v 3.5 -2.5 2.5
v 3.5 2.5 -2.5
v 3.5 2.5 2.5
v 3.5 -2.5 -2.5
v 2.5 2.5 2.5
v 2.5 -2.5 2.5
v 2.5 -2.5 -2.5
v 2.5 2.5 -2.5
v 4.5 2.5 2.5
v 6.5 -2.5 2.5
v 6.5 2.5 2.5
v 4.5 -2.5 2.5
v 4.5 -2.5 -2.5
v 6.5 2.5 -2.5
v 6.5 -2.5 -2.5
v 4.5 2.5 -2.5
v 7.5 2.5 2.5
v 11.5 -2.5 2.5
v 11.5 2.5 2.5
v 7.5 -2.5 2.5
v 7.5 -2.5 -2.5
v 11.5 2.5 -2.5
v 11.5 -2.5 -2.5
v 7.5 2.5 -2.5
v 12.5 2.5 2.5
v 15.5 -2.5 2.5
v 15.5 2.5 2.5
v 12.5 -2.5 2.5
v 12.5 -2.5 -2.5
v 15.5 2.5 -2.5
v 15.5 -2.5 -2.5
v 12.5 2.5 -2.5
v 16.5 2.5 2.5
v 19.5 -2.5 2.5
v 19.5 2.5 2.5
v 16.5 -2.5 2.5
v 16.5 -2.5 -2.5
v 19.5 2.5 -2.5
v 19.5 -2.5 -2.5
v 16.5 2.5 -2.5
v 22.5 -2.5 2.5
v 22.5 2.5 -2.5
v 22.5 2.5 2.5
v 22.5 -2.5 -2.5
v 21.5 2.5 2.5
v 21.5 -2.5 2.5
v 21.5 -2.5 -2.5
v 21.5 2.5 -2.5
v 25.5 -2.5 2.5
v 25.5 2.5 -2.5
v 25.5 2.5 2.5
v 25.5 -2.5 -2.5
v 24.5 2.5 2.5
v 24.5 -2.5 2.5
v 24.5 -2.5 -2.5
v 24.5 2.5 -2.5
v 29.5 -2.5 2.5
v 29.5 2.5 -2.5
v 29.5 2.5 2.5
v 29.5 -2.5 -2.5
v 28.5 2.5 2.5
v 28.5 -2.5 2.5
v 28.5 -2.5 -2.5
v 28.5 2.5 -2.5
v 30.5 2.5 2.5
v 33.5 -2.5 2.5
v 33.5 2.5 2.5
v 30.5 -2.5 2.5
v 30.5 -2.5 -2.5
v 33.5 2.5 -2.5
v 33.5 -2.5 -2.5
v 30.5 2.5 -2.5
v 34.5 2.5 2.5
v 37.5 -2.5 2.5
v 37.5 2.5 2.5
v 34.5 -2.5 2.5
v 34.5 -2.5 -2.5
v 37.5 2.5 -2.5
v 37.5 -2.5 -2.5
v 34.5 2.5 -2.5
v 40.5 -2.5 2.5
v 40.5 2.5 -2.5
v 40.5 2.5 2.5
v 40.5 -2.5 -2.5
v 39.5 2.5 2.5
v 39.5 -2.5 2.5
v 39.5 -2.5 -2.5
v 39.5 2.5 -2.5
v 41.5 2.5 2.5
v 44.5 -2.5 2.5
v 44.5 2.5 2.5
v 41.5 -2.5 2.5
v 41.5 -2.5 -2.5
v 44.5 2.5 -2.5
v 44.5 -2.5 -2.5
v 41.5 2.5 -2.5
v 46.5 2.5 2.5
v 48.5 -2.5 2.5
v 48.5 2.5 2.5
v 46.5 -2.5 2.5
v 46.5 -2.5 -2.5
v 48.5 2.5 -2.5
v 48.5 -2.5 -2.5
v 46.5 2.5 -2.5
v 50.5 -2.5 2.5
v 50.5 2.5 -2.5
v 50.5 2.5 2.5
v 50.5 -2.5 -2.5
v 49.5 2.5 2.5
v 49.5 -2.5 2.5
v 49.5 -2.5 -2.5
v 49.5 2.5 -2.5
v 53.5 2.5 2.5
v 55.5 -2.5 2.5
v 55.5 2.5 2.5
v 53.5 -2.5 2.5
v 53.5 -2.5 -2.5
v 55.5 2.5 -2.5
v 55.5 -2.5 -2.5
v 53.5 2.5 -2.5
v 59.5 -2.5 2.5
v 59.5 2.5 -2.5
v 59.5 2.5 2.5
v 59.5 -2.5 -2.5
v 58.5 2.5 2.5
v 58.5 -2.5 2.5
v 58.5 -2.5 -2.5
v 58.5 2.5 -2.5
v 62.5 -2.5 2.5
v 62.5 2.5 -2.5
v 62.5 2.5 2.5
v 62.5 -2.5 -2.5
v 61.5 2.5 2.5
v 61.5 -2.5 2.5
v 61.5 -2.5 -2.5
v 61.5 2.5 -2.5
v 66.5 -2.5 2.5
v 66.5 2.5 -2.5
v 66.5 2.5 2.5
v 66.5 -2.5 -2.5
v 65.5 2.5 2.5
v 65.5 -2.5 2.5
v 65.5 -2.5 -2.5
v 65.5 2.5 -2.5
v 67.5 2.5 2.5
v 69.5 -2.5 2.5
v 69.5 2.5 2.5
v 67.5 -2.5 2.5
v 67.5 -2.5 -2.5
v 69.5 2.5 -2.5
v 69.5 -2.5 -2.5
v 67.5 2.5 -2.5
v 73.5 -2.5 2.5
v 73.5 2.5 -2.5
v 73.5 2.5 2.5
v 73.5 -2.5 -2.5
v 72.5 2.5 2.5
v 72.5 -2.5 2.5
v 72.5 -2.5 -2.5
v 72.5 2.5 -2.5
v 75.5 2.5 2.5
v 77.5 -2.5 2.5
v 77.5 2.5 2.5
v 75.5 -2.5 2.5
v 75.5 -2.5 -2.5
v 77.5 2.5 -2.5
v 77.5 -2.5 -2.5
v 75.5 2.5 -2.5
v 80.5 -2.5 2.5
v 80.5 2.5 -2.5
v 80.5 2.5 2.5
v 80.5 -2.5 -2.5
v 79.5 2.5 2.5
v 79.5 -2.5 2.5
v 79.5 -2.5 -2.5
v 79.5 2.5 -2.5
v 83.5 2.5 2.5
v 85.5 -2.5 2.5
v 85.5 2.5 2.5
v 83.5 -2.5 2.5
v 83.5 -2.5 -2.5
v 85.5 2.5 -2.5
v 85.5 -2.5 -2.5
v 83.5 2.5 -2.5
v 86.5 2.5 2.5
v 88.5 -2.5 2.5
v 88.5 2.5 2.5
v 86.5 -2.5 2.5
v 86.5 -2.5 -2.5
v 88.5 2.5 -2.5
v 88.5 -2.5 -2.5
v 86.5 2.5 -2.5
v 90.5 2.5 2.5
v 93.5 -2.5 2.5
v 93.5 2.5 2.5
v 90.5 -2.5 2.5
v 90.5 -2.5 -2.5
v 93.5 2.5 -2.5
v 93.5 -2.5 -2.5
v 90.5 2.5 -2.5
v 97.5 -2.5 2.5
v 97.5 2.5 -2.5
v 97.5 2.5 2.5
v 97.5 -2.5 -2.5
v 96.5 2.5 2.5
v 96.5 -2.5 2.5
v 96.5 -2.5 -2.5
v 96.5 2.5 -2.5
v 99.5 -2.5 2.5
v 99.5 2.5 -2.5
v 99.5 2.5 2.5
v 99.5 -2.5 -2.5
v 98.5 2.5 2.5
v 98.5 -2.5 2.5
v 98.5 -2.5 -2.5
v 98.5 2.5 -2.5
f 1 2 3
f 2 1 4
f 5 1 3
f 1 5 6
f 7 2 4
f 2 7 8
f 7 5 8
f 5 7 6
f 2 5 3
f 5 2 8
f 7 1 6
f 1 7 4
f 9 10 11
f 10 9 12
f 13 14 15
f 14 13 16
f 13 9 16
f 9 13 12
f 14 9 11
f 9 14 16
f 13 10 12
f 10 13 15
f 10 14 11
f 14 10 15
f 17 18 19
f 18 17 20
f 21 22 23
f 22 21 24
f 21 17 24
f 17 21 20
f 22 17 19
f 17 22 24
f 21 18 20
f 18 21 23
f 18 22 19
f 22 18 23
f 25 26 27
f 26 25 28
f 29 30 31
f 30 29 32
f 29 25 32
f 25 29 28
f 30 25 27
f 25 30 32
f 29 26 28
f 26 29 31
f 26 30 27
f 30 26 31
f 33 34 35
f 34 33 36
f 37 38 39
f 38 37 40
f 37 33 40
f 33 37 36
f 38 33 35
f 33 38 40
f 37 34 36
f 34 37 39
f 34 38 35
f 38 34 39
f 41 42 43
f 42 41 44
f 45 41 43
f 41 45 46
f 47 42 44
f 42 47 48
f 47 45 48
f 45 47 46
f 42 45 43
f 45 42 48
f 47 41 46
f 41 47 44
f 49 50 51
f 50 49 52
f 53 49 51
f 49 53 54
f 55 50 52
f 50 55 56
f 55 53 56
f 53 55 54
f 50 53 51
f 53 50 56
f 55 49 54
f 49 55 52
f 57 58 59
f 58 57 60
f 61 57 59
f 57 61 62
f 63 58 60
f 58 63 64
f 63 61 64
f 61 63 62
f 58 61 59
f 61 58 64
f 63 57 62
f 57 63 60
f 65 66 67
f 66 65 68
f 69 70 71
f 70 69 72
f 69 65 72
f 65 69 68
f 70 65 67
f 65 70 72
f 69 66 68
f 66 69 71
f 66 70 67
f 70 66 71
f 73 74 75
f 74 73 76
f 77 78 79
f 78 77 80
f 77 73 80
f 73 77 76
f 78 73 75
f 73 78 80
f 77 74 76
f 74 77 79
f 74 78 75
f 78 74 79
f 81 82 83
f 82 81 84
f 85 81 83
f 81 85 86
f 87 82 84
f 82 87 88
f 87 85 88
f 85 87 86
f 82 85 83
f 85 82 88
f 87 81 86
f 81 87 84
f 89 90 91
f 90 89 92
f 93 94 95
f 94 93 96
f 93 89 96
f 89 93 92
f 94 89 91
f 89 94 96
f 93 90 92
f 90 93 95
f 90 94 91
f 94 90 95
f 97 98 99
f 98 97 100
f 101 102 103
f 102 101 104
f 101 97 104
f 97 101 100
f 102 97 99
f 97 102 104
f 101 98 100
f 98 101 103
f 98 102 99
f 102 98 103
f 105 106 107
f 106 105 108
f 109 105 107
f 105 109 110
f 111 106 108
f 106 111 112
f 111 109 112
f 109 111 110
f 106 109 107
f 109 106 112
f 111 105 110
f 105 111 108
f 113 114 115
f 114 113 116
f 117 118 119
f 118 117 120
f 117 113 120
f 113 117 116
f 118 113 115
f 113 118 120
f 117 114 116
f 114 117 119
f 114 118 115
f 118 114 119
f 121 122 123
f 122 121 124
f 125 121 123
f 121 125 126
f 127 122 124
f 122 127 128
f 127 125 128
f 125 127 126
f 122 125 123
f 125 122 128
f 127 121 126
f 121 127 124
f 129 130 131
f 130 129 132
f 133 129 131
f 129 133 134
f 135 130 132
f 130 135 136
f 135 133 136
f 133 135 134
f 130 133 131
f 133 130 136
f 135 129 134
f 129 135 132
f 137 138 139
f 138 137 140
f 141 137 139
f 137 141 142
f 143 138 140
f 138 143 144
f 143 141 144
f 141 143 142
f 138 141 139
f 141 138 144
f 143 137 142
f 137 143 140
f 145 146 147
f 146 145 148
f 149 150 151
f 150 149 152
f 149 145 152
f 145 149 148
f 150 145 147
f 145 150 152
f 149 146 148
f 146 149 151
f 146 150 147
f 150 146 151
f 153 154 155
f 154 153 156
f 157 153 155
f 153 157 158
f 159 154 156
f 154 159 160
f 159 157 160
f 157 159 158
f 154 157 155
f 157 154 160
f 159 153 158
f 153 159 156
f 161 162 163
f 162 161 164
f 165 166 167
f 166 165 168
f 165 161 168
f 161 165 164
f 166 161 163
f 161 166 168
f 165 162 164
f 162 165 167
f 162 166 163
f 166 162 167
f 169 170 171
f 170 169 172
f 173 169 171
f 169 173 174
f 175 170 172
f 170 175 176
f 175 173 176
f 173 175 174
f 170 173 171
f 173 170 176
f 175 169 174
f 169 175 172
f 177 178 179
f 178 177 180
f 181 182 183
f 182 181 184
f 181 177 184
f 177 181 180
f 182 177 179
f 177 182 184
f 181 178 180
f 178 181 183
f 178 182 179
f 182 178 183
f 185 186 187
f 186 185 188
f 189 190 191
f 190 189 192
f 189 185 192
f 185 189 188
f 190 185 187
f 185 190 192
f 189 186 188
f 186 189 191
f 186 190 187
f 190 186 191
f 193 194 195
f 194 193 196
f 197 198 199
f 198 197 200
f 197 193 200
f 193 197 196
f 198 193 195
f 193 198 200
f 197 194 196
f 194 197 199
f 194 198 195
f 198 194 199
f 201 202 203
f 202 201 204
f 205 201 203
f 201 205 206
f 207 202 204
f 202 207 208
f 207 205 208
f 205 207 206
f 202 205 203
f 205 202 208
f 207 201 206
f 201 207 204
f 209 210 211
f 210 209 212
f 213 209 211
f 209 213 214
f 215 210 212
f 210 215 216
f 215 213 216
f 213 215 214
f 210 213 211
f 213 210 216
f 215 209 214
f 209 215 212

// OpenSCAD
translate([3,0,0])  cube(size = [1,5,5], center=true);
translate([5,0,0])  cube(size = [1,5,5], center=true);
translate([6,0,0])  cube(size = [1,5,5], center=true);
translate([8,0,0])  cube(size = [1,5,5], center=true);
translate([9,0,0])  cube(size = [1,5,5], center=true);
translate([10,0,0])  cube(size = [1,5,5], center=true);
translate([11,0,0])  cube(size = [1,5,5], center=true);
translate([13,0,0])  cube(size = [1,5,5], center=true);
translate([14,0,0])  cube(size = [1,5,5], center=true);
translate([15,0,0])  cube(size = [1,5,5], center=true);
translate([17,0,0])  cube(size = [1,5,5], center=true);
translate([18,0,0])  cube(size = [1,5,5], center=true);
translate([19,0,0])  cube(size = [1,5,5], center=true);
translate([22,0,0])  cube(size = [1,5,5], center=true);
translate([25,0,0])  cube(size = [1,5,5], center=true);
translate([29,0,0])  cube(size = [1,5,5], center=true);
translate([31,0,0])  cube(size = [1,5,5], center=true);
translate([32,0,0])  cube(size = [1,5,5], center=true);
translate([33,0,0])  cube(size = [1,5,5], center=true);
translate([35,0,0])  cube(size = [1,5,5], center=true);
translate([36,0,0])  cube(size = [1,5,5], center=true);
translate([37,0,0])  cube(size = [1,5,5], center=true);
translate([40,0,0])  cube(size = [1,5,5], center=true);
translate([42,0,0])  cube(size = [1,5,5], center=true);
translate([43,0,0])  cube(size = [1,5,5], center=true);
translate([44,0,0])  cube(size = [1,5,5], center=true);
translate([47,0,0])  cube(size = [1,5,5], center=true);
translate([48,0,0])  cube(size = [1,5,5], center=true);
translate([50,0,0])  cube(size = [1,5,5], center=true);
translate([54,0,0])  cube(size = [1,5,5], center=true);
translate([55,0,0])  cube(size = [1,5,5], center=true);
translate([59,0,0])  cube(size = [1,5,5], center=true);
translate([62,0,0])  cube(size = [1,5,5], center=true);
translate([66,0,0])  cube(size = [1,5,5], center=true);
translate([68,0,0])  cube(size = [1,5,5], center=true);
translate([69,0,0])  cube(size = [1,5,5], center=true);
translate([73,0,0])  cube(size = [1,5,5], center=true);
translate([76,0,0])  cube(size = [1,5,5], center=true);
translate([77,0,0])  cube(size = [1,5,5], center=true);
translate([80,0,0])  cube(size = [1,5,5], center=true);
translate([84,0,0])  cube(size = [1,5,5], center=true);
translate([85,0,0])  cube(size = [1,5,5], center=true);
translate([87,0,0])  cube(size = [1,5,5], center=true);
translate([88,0,0])  cube(size = [1,5,5], center=true);
translate([91,0,0])  cube(size = [1,5,5], center=true);
translate([92,0,0])  cube(size = [1,5,5], center=true);
translate([93,0,0])  cube(size = [1,5,5], center=true);
translate([97,0,0])  cube(size = [1,5,5], center=true);
translate([99,0,0])  cube(size = [1,5,5], center=true);
